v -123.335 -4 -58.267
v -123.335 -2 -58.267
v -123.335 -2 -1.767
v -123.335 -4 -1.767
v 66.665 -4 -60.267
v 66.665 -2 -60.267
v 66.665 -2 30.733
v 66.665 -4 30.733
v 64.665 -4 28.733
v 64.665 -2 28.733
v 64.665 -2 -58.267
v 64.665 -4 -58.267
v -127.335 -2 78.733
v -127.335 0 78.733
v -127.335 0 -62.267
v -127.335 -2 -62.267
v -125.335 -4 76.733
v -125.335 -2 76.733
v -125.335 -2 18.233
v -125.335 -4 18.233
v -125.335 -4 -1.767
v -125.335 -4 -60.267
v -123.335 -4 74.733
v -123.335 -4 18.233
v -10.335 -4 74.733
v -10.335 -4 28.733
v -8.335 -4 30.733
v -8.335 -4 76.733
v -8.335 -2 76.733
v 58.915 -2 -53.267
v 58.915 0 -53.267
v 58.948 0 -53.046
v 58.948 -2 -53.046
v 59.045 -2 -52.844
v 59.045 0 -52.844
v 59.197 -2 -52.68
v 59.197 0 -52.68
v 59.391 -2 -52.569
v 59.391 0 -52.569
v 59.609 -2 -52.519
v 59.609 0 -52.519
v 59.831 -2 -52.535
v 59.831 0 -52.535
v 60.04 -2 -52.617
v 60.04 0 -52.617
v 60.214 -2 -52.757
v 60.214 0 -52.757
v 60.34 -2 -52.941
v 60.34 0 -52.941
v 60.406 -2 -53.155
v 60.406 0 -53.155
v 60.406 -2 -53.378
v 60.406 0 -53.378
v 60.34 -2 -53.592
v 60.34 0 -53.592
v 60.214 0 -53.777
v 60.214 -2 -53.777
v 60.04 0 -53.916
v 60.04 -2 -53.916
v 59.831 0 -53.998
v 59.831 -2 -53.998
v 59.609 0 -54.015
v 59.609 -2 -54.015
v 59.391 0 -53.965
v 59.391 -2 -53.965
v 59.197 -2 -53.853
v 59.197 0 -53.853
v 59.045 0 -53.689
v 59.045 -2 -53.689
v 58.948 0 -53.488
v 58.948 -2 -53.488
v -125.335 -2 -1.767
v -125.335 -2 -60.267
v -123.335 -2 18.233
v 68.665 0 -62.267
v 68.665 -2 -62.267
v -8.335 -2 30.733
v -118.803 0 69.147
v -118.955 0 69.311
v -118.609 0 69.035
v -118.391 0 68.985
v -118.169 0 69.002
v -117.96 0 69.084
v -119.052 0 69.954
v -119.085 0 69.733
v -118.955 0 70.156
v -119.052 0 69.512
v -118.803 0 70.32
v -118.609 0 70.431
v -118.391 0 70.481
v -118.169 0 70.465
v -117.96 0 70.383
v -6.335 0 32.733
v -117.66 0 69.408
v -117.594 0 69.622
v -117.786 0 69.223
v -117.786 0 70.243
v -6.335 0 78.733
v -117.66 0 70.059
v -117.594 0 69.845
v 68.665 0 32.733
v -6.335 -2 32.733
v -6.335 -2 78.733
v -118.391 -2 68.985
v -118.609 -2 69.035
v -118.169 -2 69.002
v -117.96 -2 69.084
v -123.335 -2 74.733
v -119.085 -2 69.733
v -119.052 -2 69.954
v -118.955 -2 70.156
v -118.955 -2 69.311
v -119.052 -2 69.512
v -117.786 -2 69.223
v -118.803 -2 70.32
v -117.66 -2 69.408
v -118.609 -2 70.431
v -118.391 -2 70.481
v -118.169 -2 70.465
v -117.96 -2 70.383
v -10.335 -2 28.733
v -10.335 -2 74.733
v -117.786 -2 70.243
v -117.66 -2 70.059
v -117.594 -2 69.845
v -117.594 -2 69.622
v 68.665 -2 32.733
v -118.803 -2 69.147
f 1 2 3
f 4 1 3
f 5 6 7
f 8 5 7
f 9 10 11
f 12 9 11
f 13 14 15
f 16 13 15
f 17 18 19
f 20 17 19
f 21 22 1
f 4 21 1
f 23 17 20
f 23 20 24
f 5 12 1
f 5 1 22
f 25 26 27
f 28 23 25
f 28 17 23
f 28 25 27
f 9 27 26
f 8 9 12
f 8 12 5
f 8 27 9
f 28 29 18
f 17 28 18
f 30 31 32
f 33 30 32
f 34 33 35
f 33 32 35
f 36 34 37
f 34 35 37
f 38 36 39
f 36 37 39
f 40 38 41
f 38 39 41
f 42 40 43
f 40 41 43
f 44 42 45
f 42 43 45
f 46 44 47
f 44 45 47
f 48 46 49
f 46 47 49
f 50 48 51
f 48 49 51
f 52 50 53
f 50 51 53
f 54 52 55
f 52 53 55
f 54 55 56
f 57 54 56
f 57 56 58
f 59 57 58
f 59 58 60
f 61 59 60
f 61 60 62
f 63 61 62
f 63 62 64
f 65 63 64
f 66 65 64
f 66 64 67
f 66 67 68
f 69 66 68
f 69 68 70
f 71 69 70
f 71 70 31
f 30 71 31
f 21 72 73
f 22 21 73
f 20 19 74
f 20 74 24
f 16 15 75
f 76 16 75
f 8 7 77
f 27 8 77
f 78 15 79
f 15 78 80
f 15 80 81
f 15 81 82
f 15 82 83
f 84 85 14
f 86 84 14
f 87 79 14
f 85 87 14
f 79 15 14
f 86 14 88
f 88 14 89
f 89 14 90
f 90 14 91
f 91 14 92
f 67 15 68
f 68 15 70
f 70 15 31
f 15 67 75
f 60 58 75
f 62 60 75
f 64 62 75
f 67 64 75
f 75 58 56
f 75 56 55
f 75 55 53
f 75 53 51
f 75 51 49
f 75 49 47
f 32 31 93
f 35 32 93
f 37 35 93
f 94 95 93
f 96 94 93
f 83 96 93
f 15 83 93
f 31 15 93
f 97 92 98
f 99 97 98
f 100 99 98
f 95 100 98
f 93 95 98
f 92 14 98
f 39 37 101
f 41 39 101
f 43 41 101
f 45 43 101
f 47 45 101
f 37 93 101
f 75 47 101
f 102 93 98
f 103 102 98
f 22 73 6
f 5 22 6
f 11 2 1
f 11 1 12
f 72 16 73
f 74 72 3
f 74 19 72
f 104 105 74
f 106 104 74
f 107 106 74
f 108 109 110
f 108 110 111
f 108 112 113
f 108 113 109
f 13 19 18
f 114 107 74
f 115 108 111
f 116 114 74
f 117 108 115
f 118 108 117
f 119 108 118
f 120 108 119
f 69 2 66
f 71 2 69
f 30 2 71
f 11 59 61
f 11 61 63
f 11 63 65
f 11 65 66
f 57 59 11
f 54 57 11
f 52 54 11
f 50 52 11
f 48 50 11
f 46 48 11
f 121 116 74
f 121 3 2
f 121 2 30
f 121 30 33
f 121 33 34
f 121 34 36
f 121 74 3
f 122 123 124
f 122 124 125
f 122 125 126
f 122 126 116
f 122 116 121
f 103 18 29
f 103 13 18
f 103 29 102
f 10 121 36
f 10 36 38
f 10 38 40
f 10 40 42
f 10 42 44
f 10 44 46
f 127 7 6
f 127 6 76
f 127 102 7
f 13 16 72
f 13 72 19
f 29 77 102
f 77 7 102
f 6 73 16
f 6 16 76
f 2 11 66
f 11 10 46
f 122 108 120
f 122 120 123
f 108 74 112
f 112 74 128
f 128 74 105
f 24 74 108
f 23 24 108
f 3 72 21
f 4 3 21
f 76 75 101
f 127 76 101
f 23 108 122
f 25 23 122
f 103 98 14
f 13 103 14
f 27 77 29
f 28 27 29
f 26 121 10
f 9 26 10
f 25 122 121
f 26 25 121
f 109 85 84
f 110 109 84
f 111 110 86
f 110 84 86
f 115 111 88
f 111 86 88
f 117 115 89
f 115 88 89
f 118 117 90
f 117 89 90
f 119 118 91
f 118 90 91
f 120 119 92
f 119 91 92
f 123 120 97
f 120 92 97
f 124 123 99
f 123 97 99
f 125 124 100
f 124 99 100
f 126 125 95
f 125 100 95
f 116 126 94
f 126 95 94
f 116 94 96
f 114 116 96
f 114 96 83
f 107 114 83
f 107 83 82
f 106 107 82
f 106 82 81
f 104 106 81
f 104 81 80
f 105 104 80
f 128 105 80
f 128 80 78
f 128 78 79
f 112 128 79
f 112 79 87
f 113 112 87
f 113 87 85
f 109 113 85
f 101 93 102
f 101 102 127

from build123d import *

# Parameters (mm, degrees)
F0_W     = 75
F0_H     = 95
F1_DEPTH = 2
F2_W     = 188
F2_H     = 2
F3_DEPTH = 2
F5_D     = 1.5
F5_DEPTH = 2
F6_W     = 2
F6_H     = 20
F7_DEPTH = 25


with BuildPart() as f1:
    # F0 (on Front) → F1 (new body)
    with BuildSketch(Plane.XZ):
        Polygon((-127.335447, -62.266689), (-6.335447, -62.266689), (-6.335447, 32.733311), (-6.335447, 78.733311), (-127.335447, 78.733311), align=None)
        with Locations((31.164553, -14.766689)):
            Rectangle(F0_W, F0_H)
    extrude(amount=F1_DEPTH)

    # F2 (on face) → F3 (join)
    with BuildSketch(Plane.XZ.offset(2)):
        Polygon((-123.335447, 76.733311), (-125.335447, 76.733311), (-125.335447, -60.266689), (-123.335447, -60.266689), (-123.335447, -58.266689), (-123.335447, 74.733311), align=None)
        Polygon((-8.335447, 76.733311), (-123.335447, 76.733311), (-123.335447, 74.733311), (-10.335447, 74.733311), (-8.335447, 74.733311), align=None)
        with Locations((-29.335447, -59.266689)):
            Rectangle(F2_W, F2_H)
        Polygon((-8.335447, 74.733311), (-10.335447, 74.733311), (-10.335447, 28.733311), (-8.335447, 28.733311), (-8.335447, 30.733311), align=None)
        Polygon((64.664553, -58.266689), (64.664553, -60.266689), (66.664553, -60.266689), (66.664553, 28.733311), (64.664553, 28.733311), align=None)
        Polygon((66.664553, 30.733311), (-8.335447, 30.733311), (-8.335447, 28.733311), (64.664553, 28.733311), (66.664553, 28.733311), align=None)
    extrude(amount=F3_DEPTH)

    # F5
    with Locations(Plane.XZ.offset(2)):
        with Locations((-118.335447, 69.733311), (59.664553, -53.266689)):
            Hole(F5_D / 2, depth=F5_DEPTH)

    # F6 (on face) → F7 (cut)
    with BuildSketch(Plane(origin=(-125.335447, 0, 0), x_dir=(0, -1, 0), z_dir=(-1, 0, 0))):
        with Locations((3, 8.233311)):
            Rectangle(F6_W, F6_H)
    extrude(amount=-F7_DEPTH, mode=Mode.SUBTRACT)


solid = f1.part
